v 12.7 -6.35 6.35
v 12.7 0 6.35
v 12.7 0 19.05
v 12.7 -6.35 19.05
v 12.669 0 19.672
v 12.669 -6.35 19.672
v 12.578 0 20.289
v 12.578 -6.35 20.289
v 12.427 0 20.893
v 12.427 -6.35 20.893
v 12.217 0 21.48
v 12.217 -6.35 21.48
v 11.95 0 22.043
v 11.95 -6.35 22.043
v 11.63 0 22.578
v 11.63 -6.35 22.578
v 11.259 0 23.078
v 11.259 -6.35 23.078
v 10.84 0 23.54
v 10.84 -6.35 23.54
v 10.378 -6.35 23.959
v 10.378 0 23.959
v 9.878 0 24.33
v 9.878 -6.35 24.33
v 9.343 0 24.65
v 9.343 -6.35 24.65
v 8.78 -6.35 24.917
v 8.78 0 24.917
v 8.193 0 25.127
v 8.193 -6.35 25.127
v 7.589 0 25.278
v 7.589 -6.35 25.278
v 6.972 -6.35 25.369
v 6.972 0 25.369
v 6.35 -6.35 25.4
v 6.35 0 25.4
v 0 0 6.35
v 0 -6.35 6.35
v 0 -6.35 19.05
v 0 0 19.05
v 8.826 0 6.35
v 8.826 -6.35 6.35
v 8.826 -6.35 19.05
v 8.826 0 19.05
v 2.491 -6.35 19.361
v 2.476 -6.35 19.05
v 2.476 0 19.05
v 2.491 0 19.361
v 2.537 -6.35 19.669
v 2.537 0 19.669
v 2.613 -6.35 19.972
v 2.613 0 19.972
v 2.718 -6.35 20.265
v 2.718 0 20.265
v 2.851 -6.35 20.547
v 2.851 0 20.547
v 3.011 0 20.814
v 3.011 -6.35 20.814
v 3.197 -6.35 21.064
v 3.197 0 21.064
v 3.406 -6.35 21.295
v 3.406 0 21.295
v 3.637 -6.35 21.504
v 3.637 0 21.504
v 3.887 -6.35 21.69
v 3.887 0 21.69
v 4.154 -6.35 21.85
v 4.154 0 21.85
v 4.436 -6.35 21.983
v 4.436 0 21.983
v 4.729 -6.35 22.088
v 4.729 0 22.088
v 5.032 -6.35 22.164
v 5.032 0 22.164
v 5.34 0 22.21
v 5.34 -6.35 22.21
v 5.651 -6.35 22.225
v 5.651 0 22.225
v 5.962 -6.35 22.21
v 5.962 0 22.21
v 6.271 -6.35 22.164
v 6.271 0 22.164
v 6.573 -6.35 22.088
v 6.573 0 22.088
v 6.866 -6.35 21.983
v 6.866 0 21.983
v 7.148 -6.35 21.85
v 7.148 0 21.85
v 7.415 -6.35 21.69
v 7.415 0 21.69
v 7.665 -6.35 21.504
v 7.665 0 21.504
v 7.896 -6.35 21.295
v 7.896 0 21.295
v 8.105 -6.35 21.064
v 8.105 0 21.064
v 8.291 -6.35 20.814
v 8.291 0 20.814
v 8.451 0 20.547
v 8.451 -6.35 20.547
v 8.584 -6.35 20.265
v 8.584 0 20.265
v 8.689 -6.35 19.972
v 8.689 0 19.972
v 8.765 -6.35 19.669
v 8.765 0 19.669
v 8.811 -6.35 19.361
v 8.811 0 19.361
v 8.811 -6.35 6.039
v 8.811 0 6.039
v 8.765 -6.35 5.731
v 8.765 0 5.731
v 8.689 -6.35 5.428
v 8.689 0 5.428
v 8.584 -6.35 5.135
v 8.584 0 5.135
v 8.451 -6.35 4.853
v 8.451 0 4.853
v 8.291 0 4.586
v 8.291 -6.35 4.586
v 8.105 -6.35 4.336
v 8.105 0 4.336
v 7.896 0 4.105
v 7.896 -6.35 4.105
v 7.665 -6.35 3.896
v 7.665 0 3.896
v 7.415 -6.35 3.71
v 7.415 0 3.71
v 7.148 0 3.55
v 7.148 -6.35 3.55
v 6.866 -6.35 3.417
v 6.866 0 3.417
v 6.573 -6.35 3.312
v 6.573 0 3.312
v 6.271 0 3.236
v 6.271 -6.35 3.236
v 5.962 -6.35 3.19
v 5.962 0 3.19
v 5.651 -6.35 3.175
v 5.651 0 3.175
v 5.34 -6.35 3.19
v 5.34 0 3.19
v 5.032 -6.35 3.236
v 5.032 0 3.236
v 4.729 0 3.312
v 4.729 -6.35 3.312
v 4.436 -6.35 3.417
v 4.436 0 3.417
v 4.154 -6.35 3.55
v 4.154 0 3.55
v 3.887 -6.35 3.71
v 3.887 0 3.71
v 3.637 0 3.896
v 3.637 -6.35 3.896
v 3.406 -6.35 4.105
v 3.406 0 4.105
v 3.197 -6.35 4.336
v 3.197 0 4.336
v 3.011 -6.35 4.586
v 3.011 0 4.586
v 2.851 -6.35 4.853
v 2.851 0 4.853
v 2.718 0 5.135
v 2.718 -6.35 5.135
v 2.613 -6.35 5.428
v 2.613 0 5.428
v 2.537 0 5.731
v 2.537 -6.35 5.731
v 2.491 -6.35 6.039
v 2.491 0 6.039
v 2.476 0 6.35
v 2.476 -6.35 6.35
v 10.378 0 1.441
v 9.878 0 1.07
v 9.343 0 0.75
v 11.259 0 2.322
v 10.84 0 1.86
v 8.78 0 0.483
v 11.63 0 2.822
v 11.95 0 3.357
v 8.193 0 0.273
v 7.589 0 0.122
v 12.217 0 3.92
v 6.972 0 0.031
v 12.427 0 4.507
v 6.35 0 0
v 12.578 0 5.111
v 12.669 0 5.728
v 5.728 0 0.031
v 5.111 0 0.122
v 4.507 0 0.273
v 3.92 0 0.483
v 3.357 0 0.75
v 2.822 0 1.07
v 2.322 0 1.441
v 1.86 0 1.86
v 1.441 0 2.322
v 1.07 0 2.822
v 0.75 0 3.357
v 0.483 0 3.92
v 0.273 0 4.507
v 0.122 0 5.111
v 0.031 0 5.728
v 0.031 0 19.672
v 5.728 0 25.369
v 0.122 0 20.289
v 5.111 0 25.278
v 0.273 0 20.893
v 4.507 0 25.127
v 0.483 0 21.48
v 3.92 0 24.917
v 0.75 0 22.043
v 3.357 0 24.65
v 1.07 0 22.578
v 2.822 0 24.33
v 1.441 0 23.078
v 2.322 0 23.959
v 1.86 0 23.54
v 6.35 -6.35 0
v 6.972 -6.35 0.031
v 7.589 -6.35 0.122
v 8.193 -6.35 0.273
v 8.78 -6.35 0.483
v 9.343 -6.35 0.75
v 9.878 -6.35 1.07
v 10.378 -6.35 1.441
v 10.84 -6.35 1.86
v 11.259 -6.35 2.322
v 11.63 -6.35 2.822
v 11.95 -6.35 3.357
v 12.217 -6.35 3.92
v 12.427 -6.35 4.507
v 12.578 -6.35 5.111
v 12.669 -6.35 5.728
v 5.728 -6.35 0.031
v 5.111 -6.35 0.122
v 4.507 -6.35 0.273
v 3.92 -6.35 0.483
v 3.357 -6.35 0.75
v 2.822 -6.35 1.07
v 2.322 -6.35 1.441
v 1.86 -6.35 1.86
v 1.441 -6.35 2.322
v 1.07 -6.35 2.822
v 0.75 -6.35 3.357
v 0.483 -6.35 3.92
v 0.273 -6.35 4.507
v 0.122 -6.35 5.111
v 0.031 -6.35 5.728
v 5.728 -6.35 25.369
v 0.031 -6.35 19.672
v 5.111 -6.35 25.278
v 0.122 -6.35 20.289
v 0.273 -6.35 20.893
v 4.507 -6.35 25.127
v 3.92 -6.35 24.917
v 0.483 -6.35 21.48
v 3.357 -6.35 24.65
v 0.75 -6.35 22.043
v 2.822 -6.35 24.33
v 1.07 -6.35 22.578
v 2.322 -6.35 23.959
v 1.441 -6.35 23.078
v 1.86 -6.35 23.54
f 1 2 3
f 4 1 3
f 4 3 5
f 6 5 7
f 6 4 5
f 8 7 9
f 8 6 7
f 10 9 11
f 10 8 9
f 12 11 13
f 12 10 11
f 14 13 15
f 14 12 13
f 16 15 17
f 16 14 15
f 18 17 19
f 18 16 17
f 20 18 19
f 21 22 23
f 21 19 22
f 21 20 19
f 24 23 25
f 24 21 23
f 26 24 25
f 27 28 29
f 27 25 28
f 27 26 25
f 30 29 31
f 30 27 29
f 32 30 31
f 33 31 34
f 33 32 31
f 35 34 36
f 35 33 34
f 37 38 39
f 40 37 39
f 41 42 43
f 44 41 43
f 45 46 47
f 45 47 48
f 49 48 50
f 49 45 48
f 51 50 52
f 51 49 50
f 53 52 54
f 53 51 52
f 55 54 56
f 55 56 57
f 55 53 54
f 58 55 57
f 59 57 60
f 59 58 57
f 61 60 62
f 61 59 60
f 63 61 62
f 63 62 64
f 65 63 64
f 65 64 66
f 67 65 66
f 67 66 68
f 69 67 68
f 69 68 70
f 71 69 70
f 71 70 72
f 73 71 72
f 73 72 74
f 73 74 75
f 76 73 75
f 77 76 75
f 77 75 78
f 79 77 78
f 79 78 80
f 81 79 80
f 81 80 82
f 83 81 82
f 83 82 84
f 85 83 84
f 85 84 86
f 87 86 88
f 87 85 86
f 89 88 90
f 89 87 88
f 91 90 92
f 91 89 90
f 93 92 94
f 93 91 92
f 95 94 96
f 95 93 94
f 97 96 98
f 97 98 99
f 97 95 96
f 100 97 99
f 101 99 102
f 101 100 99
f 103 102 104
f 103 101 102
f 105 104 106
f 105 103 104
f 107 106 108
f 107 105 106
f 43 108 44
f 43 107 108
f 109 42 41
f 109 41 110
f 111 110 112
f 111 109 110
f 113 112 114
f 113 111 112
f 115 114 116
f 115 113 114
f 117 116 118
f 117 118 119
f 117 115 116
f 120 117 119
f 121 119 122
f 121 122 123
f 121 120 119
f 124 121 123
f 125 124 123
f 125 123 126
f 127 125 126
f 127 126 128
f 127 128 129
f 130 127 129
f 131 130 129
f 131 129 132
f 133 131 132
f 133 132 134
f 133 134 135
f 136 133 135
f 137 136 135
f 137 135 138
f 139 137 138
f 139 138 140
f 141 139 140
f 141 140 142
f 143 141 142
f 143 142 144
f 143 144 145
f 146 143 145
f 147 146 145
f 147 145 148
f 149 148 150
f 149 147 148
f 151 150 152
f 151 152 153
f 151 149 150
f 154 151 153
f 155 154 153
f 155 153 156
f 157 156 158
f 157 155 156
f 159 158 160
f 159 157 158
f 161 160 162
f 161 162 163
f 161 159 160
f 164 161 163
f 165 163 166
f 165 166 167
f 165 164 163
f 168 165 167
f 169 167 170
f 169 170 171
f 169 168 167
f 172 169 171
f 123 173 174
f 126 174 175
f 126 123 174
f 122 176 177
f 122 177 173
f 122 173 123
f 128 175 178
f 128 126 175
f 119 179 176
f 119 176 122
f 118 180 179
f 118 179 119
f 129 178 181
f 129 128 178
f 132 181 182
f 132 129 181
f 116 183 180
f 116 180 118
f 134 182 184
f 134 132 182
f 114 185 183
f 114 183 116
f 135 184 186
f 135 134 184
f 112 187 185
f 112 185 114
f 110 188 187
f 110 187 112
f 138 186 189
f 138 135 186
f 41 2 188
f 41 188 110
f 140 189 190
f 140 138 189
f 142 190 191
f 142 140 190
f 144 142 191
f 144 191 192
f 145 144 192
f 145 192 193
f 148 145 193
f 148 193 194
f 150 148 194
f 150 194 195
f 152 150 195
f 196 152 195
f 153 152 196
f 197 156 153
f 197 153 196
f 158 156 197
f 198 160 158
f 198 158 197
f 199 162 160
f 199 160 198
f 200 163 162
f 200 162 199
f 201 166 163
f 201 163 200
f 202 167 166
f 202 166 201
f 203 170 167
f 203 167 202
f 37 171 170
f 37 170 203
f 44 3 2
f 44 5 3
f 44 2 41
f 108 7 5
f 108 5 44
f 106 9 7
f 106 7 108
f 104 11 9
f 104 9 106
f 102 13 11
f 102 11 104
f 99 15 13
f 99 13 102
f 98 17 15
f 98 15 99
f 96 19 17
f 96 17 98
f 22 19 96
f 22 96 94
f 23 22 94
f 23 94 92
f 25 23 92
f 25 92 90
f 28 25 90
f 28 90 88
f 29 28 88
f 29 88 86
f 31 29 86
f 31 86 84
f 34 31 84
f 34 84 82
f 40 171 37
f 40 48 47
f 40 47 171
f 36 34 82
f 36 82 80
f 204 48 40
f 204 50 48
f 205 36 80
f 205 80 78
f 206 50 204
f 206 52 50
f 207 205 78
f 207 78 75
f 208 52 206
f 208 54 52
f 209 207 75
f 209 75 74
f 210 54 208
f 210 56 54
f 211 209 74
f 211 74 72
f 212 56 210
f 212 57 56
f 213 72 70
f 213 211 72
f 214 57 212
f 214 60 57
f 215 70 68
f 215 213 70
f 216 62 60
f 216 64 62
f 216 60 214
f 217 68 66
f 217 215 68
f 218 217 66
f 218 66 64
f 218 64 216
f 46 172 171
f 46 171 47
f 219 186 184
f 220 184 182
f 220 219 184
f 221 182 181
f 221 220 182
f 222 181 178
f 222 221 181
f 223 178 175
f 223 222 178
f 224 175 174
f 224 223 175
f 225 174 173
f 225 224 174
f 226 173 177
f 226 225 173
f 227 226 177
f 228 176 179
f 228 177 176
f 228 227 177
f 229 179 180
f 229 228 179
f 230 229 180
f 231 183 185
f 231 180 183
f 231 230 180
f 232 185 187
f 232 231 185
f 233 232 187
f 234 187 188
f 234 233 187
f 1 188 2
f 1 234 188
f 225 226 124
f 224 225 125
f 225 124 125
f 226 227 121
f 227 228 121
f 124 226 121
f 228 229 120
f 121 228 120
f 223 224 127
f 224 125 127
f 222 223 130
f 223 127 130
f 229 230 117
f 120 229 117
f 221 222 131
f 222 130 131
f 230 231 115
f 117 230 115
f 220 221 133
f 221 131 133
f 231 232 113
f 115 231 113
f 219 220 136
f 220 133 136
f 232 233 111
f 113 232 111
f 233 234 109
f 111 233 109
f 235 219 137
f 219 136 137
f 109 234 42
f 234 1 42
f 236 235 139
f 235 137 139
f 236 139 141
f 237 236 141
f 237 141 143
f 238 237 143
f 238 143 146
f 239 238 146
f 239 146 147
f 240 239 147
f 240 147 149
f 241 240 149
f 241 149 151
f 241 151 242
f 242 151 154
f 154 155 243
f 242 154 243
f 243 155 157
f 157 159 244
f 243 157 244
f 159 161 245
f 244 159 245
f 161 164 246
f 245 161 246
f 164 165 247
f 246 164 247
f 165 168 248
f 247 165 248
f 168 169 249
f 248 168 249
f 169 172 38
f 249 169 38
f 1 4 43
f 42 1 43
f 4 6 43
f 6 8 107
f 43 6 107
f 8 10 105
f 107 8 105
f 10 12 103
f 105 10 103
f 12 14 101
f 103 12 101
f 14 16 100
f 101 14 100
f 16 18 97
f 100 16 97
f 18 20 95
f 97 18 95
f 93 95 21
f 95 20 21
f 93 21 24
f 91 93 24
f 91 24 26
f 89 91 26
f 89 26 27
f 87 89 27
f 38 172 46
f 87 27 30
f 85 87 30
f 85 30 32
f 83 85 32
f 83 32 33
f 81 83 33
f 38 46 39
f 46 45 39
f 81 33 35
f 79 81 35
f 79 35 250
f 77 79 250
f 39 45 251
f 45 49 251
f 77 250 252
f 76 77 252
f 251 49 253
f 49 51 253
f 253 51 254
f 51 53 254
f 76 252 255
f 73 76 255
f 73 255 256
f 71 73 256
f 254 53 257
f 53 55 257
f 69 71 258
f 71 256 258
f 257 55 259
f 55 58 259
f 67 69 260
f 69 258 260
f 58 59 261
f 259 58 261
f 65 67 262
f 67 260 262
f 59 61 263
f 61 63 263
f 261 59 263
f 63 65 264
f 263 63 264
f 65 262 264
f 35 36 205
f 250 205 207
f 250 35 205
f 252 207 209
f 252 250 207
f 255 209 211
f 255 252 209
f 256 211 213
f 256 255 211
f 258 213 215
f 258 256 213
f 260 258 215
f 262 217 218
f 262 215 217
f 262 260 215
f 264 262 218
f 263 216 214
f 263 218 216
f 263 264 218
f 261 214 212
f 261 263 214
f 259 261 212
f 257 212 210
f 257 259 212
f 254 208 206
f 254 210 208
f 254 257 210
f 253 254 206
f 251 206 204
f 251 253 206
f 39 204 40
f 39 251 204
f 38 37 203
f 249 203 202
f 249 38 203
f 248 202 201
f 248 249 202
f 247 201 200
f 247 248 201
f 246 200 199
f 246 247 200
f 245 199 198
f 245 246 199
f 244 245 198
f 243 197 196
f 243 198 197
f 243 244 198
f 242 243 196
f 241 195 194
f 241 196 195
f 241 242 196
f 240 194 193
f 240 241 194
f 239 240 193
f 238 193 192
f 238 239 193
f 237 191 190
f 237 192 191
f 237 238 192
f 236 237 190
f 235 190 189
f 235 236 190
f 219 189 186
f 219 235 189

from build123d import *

# Parameters (mm, degrees)
F0_W     = 12.7
F0_H     = 25.4
F1_DEPTH = 6.35
F3_DEPTH = 254
F4_W     = 6.35
F4_H     = 12.7
F5_DEPTH = 254
F8_DEPTH = 25374.6


with BuildPart() as f1:
    # F0 (on Front) → F1 (new body)
    with BuildSketch(Plane.XZ):
        with Locations((-6.35, 12.7)):
            Rectangle(F0_W, F0_H)
    extrude(amount=F1_DEPTH)

    # F2 (on face) → F3 (cut)
    with BuildSketch(Plane.XZ.offset(6.35)):
        with BuildLine():
            Line((-12.7, 25.4), (-12.7, 19.05))
            ThreePointArc((-12.7, 19.05), (-10.8401280605, 23.5401280605), (-6.35, 25.4))
            Line((-6.35, 25.4), (-12.7, 25.4))
        make_face()
        with BuildLine():
            Line((0, 25.4), (-6.35, 25.4))
            ThreePointArc((-6.35, 25.4), (-1.8598719395, 23.5401280605), (0, 19.05))
            Line((0, 19.05), (0, 25.4))
        make_face()
        with BuildLine():
            ThreePointArc((0, 6.35), (-1.8598719395, 1.8598719395), (-6.35, 0))
            Line((-6.35, 0), (0, 0))
            Line((0, 0), (0, 6.35))
        make_face()
        with BuildLine():
            ThreePointArc((-6.35, 0), (-10.8401280605, 1.8598719395), (-12.7, 6.35))
            Line((-12.7, 6.35), (-12.7, 0))
            Line((-12.7, 0), (-6.35, 0))
        make_face()
    extrude(amount=-F3_DEPTH, mode=Mode.SUBTRACT)

    # F4 (on face) → F5 (cut)
    with BuildSketch(Plane.XZ.offset(6.35)):
        with BuildLine():
            Line((-8.8261451244, 19.05), (-2.4761451244, 19.05))
            ThreePointArc((-2.4761451244, 19.05), (-5.6511451244, 22.225), (-8.8261451244, 19.05))
        make_face()
        with Locations((-5.6511451244, 12.7)):
            Rectangle(F4_W, F4_H)
        with BuildLine():
            ThreePointArc((-8.8261451244, 6.35), (-5.6511451244, 3.175), (-2.4761451244, 6.35))
            Line((-2.4761451244, 6.35), (-8.8261451244, 6.35))
        make_face()
    extrude(amount=-F5_DEPTH, mode=Mode.SUBTRACT)

    # F6: F1 across plane


with BuildPart() as f1_1:
    add(f1.part)
    add(f1.part.mirror(Plane.YZ))

    # F7 (on face) → F8 (cut)
    with BuildSketch(Plane.XZ.offset(6.35)):
        with BuildLine():
            Line((0, 6.35), (0, 19.05))
            ThreePointArc((0, 19.05), (-6.35, 25.4), (-12.7, 19.05))
            Line((-12.7, 19.05), (-12.7, 6.35))
            ThreePointArc((-12.7, 6.35), (-6.35, 0), (0, 6.35))
        make_face()
        with BuildLine():
            Line((-8.8261451244, 6.35), (-8.8261451244, 19.05))
            ThreePointArc((-8.8261451244, 19.05), (-5.6511451244, 22.225), (-2.4761451244, 19.05))
            Line((-2.4761451244, 19.05), (-2.4761451244, 6.35))
            ThreePointArc((-2.4761451244, 6.35), (-5.6511451244, 3.175), (-8.8261451244, 6.35))
        make_face(mode=Mode.SUBTRACT)
    extrude(amount=-F8_DEPTH, mode=Mode.SUBTRACT)


solid = f1_1.part
